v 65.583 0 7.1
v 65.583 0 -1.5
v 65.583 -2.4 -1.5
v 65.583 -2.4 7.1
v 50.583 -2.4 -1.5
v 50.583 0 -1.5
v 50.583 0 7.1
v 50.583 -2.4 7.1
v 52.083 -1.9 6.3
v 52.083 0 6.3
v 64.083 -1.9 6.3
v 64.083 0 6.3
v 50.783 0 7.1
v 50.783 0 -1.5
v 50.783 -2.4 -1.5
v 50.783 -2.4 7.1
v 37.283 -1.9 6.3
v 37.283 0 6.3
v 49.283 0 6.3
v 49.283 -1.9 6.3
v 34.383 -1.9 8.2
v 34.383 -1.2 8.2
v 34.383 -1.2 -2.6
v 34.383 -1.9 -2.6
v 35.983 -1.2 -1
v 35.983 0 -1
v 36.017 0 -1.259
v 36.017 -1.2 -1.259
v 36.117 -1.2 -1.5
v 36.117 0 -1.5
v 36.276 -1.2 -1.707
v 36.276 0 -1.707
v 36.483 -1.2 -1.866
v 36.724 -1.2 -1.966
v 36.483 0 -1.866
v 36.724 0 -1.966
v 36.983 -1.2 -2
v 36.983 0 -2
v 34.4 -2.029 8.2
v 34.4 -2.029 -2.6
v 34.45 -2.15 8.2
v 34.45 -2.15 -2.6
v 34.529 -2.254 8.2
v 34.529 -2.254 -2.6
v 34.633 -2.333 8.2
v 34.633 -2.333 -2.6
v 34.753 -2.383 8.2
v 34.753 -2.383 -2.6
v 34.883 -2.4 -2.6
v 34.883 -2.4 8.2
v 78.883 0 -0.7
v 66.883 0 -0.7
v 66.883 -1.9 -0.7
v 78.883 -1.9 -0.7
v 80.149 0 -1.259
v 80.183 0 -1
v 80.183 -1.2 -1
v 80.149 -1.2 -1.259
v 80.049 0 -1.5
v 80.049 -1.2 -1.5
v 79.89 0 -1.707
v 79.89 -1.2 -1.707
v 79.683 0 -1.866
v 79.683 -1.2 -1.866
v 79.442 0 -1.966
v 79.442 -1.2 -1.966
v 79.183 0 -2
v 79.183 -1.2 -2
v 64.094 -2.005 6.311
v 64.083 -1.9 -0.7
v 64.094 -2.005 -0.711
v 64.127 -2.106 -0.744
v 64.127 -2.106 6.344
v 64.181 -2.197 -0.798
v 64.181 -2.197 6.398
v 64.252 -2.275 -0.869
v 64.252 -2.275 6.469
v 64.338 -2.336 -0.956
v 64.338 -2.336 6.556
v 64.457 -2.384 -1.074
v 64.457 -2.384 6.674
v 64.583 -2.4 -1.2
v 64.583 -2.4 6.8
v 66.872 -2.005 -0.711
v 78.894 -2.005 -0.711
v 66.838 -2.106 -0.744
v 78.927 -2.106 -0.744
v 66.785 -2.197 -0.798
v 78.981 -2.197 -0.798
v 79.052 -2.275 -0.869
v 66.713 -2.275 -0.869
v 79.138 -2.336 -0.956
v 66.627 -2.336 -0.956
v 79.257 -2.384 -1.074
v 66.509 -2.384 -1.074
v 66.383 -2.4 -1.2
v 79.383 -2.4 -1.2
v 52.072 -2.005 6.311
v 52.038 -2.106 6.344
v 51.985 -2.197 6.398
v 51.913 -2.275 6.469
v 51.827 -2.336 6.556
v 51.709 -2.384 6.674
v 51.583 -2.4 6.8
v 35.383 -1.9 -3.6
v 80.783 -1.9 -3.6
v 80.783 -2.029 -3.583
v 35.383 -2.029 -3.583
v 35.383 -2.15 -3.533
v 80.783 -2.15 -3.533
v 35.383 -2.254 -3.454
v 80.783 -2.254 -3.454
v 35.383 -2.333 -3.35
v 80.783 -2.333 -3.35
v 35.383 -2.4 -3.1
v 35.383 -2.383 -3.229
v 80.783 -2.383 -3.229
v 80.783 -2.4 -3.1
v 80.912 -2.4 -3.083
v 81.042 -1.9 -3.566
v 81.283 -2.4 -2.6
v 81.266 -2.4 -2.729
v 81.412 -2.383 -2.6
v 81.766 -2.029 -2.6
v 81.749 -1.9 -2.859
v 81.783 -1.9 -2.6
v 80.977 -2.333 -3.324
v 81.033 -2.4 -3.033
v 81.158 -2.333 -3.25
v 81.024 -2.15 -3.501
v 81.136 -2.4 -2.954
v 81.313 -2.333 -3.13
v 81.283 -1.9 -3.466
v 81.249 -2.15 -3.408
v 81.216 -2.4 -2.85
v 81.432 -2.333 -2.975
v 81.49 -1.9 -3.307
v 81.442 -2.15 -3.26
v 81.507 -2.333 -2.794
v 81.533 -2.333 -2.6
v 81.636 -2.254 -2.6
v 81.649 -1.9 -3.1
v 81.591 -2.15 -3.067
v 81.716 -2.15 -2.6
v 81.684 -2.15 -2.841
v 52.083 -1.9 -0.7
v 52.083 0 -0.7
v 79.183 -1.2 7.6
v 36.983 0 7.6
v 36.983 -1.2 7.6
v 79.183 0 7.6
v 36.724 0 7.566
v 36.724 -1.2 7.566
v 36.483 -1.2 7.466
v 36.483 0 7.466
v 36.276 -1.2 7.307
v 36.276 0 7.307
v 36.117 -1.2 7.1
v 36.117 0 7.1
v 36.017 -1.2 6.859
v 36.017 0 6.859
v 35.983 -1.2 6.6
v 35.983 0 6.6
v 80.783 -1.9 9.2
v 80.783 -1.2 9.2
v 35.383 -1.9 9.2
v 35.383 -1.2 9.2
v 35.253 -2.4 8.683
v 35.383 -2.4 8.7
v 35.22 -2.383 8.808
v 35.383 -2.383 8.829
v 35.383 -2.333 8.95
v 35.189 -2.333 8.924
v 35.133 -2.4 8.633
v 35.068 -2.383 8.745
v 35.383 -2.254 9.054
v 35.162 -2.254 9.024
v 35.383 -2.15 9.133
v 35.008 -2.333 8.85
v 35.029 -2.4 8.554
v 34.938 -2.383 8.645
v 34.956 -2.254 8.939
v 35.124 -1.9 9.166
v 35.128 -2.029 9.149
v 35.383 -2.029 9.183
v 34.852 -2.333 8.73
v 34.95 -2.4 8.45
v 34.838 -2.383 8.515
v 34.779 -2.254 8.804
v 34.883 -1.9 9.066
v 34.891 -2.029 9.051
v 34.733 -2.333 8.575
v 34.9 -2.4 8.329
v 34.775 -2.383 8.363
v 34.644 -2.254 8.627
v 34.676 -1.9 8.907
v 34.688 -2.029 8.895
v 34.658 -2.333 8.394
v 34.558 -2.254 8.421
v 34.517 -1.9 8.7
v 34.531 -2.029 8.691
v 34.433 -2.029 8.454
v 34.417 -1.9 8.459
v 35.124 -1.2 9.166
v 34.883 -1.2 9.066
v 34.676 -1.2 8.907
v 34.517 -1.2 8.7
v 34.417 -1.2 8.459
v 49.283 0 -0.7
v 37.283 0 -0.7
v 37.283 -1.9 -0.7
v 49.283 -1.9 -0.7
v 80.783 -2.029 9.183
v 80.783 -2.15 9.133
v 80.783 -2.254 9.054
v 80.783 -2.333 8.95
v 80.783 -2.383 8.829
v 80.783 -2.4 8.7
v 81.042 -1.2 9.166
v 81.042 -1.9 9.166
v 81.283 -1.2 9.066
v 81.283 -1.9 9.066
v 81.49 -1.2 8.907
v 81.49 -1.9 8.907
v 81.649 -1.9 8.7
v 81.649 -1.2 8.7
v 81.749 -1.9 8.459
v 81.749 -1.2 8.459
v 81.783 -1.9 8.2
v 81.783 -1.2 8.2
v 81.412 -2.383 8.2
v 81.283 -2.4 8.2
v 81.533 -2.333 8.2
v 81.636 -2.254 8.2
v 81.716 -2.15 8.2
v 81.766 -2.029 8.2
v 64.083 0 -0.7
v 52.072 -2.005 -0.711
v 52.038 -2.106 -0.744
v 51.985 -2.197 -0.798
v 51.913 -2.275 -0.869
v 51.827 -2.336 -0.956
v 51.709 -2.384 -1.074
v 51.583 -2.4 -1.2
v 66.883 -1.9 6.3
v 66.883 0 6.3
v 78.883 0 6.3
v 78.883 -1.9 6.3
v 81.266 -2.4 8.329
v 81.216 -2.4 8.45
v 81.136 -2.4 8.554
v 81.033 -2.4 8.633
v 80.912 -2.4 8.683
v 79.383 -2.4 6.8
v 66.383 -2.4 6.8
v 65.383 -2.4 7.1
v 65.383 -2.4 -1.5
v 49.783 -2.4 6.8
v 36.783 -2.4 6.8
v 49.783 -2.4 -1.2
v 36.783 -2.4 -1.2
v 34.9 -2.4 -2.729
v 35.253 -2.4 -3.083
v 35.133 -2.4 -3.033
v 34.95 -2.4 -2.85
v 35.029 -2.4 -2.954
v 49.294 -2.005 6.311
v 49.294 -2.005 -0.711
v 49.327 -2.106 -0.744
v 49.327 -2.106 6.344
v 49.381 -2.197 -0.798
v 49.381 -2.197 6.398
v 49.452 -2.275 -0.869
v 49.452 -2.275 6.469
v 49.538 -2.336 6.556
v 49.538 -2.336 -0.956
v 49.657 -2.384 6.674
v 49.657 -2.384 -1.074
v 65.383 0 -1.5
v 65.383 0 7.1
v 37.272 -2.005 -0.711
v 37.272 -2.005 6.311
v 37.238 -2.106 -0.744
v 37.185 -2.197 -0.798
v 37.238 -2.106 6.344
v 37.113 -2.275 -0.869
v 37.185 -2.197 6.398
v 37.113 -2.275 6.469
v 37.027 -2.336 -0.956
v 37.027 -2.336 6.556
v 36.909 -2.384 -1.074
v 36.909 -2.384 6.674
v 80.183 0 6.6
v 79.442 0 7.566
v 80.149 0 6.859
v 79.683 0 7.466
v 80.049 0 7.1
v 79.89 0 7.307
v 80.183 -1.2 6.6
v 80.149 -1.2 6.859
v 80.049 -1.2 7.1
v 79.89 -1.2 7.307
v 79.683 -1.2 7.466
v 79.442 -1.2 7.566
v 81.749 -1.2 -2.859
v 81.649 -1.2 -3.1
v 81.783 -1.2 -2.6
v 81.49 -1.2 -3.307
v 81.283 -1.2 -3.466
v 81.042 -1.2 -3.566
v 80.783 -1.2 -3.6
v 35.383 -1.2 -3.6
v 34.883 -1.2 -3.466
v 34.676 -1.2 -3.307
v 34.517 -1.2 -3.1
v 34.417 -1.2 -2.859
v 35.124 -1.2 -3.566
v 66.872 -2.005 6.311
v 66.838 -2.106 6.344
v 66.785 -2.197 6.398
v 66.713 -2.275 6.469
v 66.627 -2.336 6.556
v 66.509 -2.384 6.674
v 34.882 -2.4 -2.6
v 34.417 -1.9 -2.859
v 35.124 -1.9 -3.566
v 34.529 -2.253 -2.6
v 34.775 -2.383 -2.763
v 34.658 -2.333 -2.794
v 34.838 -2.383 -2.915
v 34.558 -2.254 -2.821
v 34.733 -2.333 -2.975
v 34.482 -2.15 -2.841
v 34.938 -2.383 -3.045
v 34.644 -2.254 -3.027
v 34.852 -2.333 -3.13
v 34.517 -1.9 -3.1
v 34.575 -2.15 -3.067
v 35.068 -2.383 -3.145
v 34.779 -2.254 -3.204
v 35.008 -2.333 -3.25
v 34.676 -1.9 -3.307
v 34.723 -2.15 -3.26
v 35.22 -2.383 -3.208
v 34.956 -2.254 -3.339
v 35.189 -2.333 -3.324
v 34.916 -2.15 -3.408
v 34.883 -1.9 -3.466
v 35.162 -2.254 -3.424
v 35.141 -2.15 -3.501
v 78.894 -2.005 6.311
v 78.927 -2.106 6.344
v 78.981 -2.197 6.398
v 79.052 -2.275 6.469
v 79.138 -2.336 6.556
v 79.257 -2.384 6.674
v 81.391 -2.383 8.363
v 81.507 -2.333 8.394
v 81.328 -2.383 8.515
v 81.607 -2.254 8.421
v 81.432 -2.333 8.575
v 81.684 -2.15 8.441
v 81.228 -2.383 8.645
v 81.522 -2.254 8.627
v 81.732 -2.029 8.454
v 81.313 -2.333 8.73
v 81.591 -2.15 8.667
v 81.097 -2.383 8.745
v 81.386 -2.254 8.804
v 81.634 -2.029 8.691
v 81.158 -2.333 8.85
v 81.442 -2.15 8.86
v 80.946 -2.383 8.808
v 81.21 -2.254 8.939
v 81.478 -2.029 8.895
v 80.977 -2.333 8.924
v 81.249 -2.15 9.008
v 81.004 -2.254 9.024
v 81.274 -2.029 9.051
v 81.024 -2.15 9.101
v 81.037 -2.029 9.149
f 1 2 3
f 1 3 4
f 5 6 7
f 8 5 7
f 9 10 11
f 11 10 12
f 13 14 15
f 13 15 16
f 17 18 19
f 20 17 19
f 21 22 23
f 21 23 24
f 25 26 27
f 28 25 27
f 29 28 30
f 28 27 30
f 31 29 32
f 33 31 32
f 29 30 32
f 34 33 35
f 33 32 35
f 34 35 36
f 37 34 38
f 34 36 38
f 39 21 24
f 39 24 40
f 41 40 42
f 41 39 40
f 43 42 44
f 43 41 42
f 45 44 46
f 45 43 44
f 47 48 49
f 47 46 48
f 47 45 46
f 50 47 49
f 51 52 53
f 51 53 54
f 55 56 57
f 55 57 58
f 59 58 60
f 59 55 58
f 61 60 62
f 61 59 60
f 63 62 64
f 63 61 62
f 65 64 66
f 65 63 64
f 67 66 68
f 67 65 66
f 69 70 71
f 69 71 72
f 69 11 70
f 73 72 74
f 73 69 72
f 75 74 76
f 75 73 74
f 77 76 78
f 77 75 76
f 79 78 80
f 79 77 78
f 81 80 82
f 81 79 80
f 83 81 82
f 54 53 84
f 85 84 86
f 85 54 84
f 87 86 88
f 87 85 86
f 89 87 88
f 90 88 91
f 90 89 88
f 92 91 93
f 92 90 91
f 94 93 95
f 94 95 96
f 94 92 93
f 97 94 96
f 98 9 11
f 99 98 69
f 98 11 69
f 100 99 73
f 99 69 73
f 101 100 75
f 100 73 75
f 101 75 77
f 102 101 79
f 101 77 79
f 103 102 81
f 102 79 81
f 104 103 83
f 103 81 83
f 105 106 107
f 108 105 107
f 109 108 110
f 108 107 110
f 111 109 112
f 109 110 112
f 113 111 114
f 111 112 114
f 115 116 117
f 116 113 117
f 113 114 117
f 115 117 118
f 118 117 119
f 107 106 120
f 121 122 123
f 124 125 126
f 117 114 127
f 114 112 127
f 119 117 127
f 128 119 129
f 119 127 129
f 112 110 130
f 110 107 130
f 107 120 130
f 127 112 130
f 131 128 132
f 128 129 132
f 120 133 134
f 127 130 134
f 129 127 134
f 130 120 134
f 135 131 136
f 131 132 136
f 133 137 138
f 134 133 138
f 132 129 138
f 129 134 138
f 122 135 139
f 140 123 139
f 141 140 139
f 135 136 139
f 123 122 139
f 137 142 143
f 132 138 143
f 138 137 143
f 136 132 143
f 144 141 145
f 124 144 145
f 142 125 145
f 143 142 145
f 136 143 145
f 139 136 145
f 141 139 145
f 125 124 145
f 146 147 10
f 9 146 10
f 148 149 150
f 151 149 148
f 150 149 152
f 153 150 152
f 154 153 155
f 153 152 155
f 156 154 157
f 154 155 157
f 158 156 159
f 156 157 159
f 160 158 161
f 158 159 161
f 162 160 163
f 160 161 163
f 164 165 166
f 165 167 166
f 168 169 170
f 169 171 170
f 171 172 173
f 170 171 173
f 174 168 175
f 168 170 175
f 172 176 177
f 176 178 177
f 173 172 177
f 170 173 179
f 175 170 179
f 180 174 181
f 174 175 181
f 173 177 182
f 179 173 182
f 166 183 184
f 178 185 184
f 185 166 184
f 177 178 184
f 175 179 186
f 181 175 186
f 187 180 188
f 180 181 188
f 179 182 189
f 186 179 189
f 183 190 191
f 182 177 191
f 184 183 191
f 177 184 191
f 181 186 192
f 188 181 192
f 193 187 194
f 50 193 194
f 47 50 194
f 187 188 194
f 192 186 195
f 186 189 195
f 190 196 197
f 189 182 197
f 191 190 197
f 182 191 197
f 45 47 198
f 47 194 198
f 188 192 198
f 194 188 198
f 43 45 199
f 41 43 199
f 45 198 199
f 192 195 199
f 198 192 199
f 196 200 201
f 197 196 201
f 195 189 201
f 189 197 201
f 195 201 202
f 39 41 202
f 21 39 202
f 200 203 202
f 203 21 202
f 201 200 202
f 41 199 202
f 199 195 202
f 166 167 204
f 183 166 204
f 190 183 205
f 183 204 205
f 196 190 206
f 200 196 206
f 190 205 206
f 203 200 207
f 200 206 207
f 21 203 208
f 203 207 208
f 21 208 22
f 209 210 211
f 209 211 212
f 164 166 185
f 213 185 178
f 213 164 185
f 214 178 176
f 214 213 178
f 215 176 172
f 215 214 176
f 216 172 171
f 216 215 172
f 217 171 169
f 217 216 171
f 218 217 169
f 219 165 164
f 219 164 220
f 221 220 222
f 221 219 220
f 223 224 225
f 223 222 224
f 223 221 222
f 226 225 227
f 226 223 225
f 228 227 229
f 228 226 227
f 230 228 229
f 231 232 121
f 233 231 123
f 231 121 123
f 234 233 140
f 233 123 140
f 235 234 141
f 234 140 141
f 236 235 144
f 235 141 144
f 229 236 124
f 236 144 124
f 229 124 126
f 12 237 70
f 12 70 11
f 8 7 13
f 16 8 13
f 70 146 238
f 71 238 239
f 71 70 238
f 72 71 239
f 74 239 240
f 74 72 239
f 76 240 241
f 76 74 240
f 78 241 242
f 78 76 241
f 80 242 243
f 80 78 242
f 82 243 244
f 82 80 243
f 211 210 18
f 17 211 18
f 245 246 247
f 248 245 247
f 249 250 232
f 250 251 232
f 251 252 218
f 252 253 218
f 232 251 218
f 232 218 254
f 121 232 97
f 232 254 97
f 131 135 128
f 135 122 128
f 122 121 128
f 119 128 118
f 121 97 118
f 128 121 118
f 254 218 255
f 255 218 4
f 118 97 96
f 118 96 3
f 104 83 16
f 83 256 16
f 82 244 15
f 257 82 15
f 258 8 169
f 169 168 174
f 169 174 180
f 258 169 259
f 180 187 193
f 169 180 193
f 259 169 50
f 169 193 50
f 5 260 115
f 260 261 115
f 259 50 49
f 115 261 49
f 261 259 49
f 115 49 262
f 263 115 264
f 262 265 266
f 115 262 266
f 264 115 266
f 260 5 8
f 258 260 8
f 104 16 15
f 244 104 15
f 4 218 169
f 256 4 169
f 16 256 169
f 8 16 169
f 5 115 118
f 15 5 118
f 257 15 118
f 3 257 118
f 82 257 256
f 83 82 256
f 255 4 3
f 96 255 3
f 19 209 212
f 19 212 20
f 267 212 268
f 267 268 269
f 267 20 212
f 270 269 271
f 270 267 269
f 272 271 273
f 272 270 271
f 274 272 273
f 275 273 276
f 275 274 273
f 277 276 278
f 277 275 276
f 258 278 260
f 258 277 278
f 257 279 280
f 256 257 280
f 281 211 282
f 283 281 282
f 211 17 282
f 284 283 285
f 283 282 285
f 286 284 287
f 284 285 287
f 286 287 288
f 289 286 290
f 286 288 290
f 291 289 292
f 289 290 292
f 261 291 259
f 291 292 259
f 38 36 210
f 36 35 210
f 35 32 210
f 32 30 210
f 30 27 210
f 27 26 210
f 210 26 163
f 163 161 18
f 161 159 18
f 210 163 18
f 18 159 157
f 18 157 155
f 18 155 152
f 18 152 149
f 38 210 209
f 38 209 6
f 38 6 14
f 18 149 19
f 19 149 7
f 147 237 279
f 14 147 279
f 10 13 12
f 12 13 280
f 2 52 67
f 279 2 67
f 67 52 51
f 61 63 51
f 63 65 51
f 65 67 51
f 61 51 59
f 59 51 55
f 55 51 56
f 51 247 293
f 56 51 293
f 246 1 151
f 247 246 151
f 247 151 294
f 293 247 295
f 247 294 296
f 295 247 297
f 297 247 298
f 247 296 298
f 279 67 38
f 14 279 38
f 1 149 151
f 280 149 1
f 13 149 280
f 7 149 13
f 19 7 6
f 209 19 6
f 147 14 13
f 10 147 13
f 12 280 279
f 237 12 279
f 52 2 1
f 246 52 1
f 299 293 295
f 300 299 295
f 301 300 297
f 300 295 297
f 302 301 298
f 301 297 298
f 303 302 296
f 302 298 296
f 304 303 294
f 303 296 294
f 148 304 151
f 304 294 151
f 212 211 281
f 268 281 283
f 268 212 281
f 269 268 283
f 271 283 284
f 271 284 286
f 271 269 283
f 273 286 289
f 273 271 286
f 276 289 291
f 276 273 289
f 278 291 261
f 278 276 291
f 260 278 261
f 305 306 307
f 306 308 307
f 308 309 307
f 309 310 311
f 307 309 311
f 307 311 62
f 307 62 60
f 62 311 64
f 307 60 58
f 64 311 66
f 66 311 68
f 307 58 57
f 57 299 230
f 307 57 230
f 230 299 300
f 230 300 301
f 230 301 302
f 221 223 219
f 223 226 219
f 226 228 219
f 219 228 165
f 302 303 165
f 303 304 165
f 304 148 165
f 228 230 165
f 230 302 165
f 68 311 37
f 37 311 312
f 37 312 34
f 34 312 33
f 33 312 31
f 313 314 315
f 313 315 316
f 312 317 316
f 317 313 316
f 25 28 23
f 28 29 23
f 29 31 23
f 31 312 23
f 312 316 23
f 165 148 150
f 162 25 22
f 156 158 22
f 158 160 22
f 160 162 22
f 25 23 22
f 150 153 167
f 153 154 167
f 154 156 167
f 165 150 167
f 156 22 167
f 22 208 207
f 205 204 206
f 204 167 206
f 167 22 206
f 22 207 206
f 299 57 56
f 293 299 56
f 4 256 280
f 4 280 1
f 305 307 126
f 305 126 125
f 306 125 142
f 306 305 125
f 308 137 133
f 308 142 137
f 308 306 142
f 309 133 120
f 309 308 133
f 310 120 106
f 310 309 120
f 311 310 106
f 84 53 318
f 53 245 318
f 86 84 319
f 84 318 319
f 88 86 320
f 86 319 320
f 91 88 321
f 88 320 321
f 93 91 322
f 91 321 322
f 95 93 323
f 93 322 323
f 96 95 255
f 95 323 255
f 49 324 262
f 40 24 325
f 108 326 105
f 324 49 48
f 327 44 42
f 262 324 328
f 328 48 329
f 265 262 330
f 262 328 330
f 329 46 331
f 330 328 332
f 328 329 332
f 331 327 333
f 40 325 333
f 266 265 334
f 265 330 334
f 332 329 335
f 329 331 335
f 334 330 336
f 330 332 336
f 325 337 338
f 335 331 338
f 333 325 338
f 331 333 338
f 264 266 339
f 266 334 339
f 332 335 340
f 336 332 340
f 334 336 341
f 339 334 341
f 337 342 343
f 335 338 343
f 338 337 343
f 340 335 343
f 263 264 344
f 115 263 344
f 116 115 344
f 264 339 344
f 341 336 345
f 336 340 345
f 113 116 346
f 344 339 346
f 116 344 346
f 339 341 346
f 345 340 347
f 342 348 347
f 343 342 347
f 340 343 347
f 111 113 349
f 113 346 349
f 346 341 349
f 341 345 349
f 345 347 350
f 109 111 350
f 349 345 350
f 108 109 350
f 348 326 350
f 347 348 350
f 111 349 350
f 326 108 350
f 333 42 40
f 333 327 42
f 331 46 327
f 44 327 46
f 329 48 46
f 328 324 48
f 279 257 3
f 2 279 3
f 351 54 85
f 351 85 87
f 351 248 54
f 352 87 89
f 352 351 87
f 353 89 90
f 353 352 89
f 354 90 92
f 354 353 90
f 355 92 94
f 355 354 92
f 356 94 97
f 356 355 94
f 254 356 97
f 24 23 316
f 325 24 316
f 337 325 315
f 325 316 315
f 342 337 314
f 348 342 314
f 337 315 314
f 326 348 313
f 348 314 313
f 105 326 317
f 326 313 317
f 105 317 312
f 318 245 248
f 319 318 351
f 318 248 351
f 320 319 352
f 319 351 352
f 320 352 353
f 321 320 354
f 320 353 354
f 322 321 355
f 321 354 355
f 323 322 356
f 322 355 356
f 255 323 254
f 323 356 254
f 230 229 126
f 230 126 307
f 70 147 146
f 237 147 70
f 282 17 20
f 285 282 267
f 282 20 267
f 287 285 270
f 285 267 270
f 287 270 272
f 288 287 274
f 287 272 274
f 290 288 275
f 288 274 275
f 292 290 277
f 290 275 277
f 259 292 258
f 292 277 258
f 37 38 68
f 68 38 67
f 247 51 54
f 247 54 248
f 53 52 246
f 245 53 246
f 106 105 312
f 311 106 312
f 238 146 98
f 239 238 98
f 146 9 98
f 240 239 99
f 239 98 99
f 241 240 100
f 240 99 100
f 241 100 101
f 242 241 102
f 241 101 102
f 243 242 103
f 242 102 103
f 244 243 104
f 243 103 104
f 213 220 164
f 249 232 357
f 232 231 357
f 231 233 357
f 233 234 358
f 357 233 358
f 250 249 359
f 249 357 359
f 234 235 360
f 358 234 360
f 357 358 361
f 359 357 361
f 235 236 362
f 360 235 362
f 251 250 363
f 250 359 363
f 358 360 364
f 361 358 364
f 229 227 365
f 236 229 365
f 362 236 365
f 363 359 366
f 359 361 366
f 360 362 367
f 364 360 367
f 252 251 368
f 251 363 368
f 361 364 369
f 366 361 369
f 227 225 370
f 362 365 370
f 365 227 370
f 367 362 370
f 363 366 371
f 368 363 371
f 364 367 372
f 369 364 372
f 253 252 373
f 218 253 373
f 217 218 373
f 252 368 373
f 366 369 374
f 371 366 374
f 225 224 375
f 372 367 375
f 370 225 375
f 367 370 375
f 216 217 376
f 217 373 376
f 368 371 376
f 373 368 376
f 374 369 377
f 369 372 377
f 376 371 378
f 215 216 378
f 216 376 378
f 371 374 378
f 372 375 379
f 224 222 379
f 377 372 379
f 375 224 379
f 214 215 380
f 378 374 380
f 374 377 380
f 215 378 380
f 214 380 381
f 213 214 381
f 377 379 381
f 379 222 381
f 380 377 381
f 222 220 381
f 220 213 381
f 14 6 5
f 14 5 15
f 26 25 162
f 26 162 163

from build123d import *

# Parameters (mm, degrees)
F0_W          = 44.2
F0_H          = 9.6
F0_W_2        = 12
F0_H_2        = 7
F0_W_3        = 0.2
F0_H_3        = 8.6
F1_DEPTH      = 2.4
F2_R          = 0.5
F3_W          = 44.2
F3_H          = 1.2
F4_DEPTH      = 1.6
F5_W          = 44.2
F5_H          = 1.2
F6_DEPTH      = 1.6
F8_DEPTH      = 1.6
F10_DEPTH     = 1.6
F11_R         = 0.5
F12_T1_DEPTH  = 3.7
F12_T3_DEPTH  = 3.7
F12_T6_ANGLE  = 90
F12_T8_ANGLE  = 90
F12_T10_ANGLE = 90
F12_T12_ANGLE = 90


# Not quite as in the source:
# - a fillet or chamfer that OpenCascade refuses, or shapes differently, is made with other operations: its cross-section is extruded or revolved along the edge and cut away or added
# - a feature names something its author has since deleted; it is built from what else it names


with BuildPart() as f1:
    # F0 (on Front) → F1 (new body)
    with BuildSketch(Plane.XZ):
        with Locations((58.0827572465, 2.8)):
            Rectangle(F0_W, F0_H)
        with Locations((43.2827572465, 2.8)):
            Rectangle(F0_W_2, F0_H_2, mode=Mode.SUBTRACT)
        with Locations((50.6827572465, 2.8)):
            Rectangle(F0_W_3, F0_H_3, mode=Mode.SUBTRACT)
        with Locations((58.0827572465, 2.8)):
            Rectangle(F0_W_2, F0_H_2, mode=Mode.SUBTRACT)
        with Locations((65.4827572465, 2.8)):
            Rectangle(F0_W_3, F0_H_3, mode=Mode.SUBTRACT)
        with Locations((72.8827572465, 2.8)):
            Rectangle(F0_W_2, F0_H_2, mode=Mode.SUBTRACT)
    extrude(amount=F1_DEPTH)

    # F2
    f2_edges = [f1.edges().sort_by_distance(p)[0] for p in [
        (43.282757, -2.4, 6.3),
        (37.282757, -2.4, 2.8),
        (49.282757, -2.4, 2.8),
        (58.082757, -2.4, 6.3),
        (52.082757, -2.4, 2.8),
        (58.082757, -2.4, -0.7),
        (43.282757, -2.4, -0.7),
        (64.082757, -2.4, 2.8),
        (66.882757, -2.4, 2.8),
        (72.882757, -2.4, -0.7),
        (72.882757, -2.4, 6.3),
        (78.882757, -2.4, 2.8),
    ]]
    fillet(f2_edges, radius=F2_R)

    # F3 (on face) → F4 (join)
    with BuildSketch(Plane(origin=(0, 0, -2), x_dir=(1, 0, 0), z_dir=(0, 0, -1))):
        with Locations((58.0827572465, 1.8)):
            Rectangle(F3_W, F3_H)
    extrude(amount=F4_DEPTH)

    # F5 (on face) → F6 (join)
    with BuildSketch(Plane.XY.offset(7.6)):
        with Locations((58.0827572465, -1.8)):
            Rectangle(F5_W, F5_H)
    extrude(amount=F6_DEPTH)

    # F7 (on face) → F8 (join)
    with BuildSketch(Plane(origin=(35.9827572465, 0, 0), x_dir=(0, -1, 0), z_dir=(-1, 0, 0))):
        Polygon((2.4, -3.6), (2.4, 9.2), (1.2, 9.2), (1.2, 7.6), (1.2, -2), (1.2, -3.6), align=None)
    extrude(amount=F8_DEPTH)

    # F9 (on face) → F10 (join)
    with BuildSketch(Plane.YZ.offset(80.1827572465)):
        Polygon((-1.2, 9.2), (-2.4, 9.2), (-2.4, -3.6), (-1.2, -3.6), (-1.2, -2), (-1.2, 7.6), align=None)
    extrude(amount=F10_DEPTH)

    # F11
    f11_edges = [f1.edges().sort_by_distance(p)[0] for p in [
        (58.082757, -2.4, 9.2),
        (81.782757, -2.4, 2.8),
        (58.082757, -2.4, -3.6),
        (34.382757, -2.4, 2.8),
    ]]
    fillet(f11_edges, radius=F11_R)

    # F12: fillet of radius 1 on 8 edges, made by hand

    # F12_s2 → F12_t1 (cut)
    with BuildSketch(Plane.XZ.offset(-2.5)):
        with BuildLine():
            ThreePointArc((36.9827572465, 7.6), (36.2756504653, 7.3071067812), (35.9827572465, 6.6))
            Line((35.9827572465, 6.6), (35.9827572465, 7.6))
            Line((35.9827572465, 7.6), (36.9827572465, 7.6))
        make_face()
        with BuildLine():
            ThreePointArc((35.9827572465, -1), (36.2756504653, -1.7071067812), (36.9827572465, -2))
            Line((36.9827572465, -2), (35.9827572465, -2))
            Line((35.9827572465, -2), (35.9827572465, -1))
        make_face()
        with BuildLine():
            ThreePointArc((80.1827572465, -1), (79.8898640277, -1.7071067812), (79.1827572465, -2))
            Line((79.1827572465, -2), (80.1827572465, -2))
            Line((80.1827572465, -2), (80.1827572465, -1))
        make_face()
        with BuildLine():
            ThreePointArc((80.1827572465, 6.6), (79.8898640277, 7.3071067812), (79.1827572465, 7.6))
            Line((79.1827572465, 7.6), (80.1827572465, 7.6))
            Line((80.1827572465, 7.6), (80.1827572465, 6.6))
        make_face()
    extrude(amount=F12_T1_DEPTH, mode=Mode.SUBTRACT)

    # F12_s4 → F12_t3 (cut)
    with BuildSketch(Plane.XZ.offset(-1.3)):
        with BuildLine():
            ThreePointArc((80.7827572465, 9.2), (81.4898640277, 8.9071067812), (81.7827572465, 8.2))
            Line((81.7827572465, 8.2), (81.7827572465, 9.2))
            Line((81.7827572465, 9.2), (80.7827572465, 9.2))
        make_face()
        with BuildLine():
            ThreePointArc((81.7827572465, -2.6), (81.4898640277, -3.3071067812), (80.7827572465, -3.6))
            Line((80.7827572465, -3.6), (81.7827572465, -3.6))
            Line((81.7827572465, -3.6), (81.7827572465, -2.6))
        make_face()
        with BuildLine():
            ThreePointArc((34.3827572465, -2.6), (34.6756504653, -3.3071067812), (35.3827572465, -3.6))
            Line((35.3827572465, -3.6), (34.3827572465, -3.6))
            Line((34.3827572465, -3.6), (34.3827572465, -2.6))
        make_face()
        with BuildLine():
            ThreePointArc((35.3827572465, 9.2), (34.6756504653, 8.9071067812), (34.3827572465, 8.2))
            Line((34.3827572465, 8.2), (34.3827572465, 9.2))
            Line((34.3827572465, 9.2), (35.3827572465, 9.2))
        make_face()
    extrude(amount=F12_T3_DEPTH, mode=Mode.SUBTRACT)

    # F12_s5 → F12_t6 (revolve, cut)
    with BuildSketch(Plane.YZ.offset(35.3827572465)):
        with BuildLine():
            ThreePointArc((-2.4, 8.7), (-2.2535533906, 9.0535533906), (-1.9, 9.2))
            Line((-1.9, 9.2), (-2.4, 9.2))
            Line((-2.4, 9.2), (-2.4, 8.7))
        make_face()
    revolve(axis=Axis((35.3827572465, -2.4, 8.2), (0, -1, 0)), revolution_arc=F12_T6_ANGLE, mode=Mode.SUBTRACT)

    # F12_s7 → F12_t8 (revolve, cut)
    with BuildSketch(Plane.XY.offset(-2.6)):
        with BuildLine():
            ThreePointArc((34.8827572465, -2.4), (34.5292038559, -2.2535533906), (34.3827572465, -1.9))
            Line((34.3827572465, -1.9), (34.3827572465, -2.4))
            Line((34.3827572465, -2.4), (34.8827572465, -2.4))
        make_face()
    revolve(axis=Axis((35.3827572465, -2.4, -2.6), (0, -1, 0)), revolution_arc=F12_T8_ANGLE, mode=Mode.SUBTRACT)

    # F12_s9 → F12_t10 (revolve, cut)
    with BuildSketch(Plane.YZ.offset(80.7827572465)):
        with BuildLine():
            ThreePointArc((-2.4, -3.1), (-2.2535533906, -3.4535533906), (-1.9, -3.6))
            Line((-1.9, -3.6), (-2.4, -3.6))
            Line((-2.4, -3.6), (-2.4, -3.1))
        make_face()
    revolve(axis=Axis((80.7827572465, -2.4, -2.6), (0, -1, 0)), revolution_arc=F12_T10_ANGLE, mode=Mode.SUBTRACT)

    # F12_s11 → F12_t12 (revolve, cut)
    with BuildSketch(Plane.XY.offset(8.2)):
        with BuildLine():
            ThreePointArc((81.2827572465, -2.4), (81.6363106371, -2.2535533906), (81.7827572465, -1.9))
            Line((81.7827572465, -1.9), (81.7827572465, -2.4))
            Line((81.7827572465, -2.4), (81.2827572465, -2.4))
        make_face()
    revolve(axis=Axis((80.7827572465, -2.4, 8.2), (0, -1, 0)), revolution_arc=F12_T12_ANGLE, mode=Mode.SUBTRACT)


solid = f1.part
